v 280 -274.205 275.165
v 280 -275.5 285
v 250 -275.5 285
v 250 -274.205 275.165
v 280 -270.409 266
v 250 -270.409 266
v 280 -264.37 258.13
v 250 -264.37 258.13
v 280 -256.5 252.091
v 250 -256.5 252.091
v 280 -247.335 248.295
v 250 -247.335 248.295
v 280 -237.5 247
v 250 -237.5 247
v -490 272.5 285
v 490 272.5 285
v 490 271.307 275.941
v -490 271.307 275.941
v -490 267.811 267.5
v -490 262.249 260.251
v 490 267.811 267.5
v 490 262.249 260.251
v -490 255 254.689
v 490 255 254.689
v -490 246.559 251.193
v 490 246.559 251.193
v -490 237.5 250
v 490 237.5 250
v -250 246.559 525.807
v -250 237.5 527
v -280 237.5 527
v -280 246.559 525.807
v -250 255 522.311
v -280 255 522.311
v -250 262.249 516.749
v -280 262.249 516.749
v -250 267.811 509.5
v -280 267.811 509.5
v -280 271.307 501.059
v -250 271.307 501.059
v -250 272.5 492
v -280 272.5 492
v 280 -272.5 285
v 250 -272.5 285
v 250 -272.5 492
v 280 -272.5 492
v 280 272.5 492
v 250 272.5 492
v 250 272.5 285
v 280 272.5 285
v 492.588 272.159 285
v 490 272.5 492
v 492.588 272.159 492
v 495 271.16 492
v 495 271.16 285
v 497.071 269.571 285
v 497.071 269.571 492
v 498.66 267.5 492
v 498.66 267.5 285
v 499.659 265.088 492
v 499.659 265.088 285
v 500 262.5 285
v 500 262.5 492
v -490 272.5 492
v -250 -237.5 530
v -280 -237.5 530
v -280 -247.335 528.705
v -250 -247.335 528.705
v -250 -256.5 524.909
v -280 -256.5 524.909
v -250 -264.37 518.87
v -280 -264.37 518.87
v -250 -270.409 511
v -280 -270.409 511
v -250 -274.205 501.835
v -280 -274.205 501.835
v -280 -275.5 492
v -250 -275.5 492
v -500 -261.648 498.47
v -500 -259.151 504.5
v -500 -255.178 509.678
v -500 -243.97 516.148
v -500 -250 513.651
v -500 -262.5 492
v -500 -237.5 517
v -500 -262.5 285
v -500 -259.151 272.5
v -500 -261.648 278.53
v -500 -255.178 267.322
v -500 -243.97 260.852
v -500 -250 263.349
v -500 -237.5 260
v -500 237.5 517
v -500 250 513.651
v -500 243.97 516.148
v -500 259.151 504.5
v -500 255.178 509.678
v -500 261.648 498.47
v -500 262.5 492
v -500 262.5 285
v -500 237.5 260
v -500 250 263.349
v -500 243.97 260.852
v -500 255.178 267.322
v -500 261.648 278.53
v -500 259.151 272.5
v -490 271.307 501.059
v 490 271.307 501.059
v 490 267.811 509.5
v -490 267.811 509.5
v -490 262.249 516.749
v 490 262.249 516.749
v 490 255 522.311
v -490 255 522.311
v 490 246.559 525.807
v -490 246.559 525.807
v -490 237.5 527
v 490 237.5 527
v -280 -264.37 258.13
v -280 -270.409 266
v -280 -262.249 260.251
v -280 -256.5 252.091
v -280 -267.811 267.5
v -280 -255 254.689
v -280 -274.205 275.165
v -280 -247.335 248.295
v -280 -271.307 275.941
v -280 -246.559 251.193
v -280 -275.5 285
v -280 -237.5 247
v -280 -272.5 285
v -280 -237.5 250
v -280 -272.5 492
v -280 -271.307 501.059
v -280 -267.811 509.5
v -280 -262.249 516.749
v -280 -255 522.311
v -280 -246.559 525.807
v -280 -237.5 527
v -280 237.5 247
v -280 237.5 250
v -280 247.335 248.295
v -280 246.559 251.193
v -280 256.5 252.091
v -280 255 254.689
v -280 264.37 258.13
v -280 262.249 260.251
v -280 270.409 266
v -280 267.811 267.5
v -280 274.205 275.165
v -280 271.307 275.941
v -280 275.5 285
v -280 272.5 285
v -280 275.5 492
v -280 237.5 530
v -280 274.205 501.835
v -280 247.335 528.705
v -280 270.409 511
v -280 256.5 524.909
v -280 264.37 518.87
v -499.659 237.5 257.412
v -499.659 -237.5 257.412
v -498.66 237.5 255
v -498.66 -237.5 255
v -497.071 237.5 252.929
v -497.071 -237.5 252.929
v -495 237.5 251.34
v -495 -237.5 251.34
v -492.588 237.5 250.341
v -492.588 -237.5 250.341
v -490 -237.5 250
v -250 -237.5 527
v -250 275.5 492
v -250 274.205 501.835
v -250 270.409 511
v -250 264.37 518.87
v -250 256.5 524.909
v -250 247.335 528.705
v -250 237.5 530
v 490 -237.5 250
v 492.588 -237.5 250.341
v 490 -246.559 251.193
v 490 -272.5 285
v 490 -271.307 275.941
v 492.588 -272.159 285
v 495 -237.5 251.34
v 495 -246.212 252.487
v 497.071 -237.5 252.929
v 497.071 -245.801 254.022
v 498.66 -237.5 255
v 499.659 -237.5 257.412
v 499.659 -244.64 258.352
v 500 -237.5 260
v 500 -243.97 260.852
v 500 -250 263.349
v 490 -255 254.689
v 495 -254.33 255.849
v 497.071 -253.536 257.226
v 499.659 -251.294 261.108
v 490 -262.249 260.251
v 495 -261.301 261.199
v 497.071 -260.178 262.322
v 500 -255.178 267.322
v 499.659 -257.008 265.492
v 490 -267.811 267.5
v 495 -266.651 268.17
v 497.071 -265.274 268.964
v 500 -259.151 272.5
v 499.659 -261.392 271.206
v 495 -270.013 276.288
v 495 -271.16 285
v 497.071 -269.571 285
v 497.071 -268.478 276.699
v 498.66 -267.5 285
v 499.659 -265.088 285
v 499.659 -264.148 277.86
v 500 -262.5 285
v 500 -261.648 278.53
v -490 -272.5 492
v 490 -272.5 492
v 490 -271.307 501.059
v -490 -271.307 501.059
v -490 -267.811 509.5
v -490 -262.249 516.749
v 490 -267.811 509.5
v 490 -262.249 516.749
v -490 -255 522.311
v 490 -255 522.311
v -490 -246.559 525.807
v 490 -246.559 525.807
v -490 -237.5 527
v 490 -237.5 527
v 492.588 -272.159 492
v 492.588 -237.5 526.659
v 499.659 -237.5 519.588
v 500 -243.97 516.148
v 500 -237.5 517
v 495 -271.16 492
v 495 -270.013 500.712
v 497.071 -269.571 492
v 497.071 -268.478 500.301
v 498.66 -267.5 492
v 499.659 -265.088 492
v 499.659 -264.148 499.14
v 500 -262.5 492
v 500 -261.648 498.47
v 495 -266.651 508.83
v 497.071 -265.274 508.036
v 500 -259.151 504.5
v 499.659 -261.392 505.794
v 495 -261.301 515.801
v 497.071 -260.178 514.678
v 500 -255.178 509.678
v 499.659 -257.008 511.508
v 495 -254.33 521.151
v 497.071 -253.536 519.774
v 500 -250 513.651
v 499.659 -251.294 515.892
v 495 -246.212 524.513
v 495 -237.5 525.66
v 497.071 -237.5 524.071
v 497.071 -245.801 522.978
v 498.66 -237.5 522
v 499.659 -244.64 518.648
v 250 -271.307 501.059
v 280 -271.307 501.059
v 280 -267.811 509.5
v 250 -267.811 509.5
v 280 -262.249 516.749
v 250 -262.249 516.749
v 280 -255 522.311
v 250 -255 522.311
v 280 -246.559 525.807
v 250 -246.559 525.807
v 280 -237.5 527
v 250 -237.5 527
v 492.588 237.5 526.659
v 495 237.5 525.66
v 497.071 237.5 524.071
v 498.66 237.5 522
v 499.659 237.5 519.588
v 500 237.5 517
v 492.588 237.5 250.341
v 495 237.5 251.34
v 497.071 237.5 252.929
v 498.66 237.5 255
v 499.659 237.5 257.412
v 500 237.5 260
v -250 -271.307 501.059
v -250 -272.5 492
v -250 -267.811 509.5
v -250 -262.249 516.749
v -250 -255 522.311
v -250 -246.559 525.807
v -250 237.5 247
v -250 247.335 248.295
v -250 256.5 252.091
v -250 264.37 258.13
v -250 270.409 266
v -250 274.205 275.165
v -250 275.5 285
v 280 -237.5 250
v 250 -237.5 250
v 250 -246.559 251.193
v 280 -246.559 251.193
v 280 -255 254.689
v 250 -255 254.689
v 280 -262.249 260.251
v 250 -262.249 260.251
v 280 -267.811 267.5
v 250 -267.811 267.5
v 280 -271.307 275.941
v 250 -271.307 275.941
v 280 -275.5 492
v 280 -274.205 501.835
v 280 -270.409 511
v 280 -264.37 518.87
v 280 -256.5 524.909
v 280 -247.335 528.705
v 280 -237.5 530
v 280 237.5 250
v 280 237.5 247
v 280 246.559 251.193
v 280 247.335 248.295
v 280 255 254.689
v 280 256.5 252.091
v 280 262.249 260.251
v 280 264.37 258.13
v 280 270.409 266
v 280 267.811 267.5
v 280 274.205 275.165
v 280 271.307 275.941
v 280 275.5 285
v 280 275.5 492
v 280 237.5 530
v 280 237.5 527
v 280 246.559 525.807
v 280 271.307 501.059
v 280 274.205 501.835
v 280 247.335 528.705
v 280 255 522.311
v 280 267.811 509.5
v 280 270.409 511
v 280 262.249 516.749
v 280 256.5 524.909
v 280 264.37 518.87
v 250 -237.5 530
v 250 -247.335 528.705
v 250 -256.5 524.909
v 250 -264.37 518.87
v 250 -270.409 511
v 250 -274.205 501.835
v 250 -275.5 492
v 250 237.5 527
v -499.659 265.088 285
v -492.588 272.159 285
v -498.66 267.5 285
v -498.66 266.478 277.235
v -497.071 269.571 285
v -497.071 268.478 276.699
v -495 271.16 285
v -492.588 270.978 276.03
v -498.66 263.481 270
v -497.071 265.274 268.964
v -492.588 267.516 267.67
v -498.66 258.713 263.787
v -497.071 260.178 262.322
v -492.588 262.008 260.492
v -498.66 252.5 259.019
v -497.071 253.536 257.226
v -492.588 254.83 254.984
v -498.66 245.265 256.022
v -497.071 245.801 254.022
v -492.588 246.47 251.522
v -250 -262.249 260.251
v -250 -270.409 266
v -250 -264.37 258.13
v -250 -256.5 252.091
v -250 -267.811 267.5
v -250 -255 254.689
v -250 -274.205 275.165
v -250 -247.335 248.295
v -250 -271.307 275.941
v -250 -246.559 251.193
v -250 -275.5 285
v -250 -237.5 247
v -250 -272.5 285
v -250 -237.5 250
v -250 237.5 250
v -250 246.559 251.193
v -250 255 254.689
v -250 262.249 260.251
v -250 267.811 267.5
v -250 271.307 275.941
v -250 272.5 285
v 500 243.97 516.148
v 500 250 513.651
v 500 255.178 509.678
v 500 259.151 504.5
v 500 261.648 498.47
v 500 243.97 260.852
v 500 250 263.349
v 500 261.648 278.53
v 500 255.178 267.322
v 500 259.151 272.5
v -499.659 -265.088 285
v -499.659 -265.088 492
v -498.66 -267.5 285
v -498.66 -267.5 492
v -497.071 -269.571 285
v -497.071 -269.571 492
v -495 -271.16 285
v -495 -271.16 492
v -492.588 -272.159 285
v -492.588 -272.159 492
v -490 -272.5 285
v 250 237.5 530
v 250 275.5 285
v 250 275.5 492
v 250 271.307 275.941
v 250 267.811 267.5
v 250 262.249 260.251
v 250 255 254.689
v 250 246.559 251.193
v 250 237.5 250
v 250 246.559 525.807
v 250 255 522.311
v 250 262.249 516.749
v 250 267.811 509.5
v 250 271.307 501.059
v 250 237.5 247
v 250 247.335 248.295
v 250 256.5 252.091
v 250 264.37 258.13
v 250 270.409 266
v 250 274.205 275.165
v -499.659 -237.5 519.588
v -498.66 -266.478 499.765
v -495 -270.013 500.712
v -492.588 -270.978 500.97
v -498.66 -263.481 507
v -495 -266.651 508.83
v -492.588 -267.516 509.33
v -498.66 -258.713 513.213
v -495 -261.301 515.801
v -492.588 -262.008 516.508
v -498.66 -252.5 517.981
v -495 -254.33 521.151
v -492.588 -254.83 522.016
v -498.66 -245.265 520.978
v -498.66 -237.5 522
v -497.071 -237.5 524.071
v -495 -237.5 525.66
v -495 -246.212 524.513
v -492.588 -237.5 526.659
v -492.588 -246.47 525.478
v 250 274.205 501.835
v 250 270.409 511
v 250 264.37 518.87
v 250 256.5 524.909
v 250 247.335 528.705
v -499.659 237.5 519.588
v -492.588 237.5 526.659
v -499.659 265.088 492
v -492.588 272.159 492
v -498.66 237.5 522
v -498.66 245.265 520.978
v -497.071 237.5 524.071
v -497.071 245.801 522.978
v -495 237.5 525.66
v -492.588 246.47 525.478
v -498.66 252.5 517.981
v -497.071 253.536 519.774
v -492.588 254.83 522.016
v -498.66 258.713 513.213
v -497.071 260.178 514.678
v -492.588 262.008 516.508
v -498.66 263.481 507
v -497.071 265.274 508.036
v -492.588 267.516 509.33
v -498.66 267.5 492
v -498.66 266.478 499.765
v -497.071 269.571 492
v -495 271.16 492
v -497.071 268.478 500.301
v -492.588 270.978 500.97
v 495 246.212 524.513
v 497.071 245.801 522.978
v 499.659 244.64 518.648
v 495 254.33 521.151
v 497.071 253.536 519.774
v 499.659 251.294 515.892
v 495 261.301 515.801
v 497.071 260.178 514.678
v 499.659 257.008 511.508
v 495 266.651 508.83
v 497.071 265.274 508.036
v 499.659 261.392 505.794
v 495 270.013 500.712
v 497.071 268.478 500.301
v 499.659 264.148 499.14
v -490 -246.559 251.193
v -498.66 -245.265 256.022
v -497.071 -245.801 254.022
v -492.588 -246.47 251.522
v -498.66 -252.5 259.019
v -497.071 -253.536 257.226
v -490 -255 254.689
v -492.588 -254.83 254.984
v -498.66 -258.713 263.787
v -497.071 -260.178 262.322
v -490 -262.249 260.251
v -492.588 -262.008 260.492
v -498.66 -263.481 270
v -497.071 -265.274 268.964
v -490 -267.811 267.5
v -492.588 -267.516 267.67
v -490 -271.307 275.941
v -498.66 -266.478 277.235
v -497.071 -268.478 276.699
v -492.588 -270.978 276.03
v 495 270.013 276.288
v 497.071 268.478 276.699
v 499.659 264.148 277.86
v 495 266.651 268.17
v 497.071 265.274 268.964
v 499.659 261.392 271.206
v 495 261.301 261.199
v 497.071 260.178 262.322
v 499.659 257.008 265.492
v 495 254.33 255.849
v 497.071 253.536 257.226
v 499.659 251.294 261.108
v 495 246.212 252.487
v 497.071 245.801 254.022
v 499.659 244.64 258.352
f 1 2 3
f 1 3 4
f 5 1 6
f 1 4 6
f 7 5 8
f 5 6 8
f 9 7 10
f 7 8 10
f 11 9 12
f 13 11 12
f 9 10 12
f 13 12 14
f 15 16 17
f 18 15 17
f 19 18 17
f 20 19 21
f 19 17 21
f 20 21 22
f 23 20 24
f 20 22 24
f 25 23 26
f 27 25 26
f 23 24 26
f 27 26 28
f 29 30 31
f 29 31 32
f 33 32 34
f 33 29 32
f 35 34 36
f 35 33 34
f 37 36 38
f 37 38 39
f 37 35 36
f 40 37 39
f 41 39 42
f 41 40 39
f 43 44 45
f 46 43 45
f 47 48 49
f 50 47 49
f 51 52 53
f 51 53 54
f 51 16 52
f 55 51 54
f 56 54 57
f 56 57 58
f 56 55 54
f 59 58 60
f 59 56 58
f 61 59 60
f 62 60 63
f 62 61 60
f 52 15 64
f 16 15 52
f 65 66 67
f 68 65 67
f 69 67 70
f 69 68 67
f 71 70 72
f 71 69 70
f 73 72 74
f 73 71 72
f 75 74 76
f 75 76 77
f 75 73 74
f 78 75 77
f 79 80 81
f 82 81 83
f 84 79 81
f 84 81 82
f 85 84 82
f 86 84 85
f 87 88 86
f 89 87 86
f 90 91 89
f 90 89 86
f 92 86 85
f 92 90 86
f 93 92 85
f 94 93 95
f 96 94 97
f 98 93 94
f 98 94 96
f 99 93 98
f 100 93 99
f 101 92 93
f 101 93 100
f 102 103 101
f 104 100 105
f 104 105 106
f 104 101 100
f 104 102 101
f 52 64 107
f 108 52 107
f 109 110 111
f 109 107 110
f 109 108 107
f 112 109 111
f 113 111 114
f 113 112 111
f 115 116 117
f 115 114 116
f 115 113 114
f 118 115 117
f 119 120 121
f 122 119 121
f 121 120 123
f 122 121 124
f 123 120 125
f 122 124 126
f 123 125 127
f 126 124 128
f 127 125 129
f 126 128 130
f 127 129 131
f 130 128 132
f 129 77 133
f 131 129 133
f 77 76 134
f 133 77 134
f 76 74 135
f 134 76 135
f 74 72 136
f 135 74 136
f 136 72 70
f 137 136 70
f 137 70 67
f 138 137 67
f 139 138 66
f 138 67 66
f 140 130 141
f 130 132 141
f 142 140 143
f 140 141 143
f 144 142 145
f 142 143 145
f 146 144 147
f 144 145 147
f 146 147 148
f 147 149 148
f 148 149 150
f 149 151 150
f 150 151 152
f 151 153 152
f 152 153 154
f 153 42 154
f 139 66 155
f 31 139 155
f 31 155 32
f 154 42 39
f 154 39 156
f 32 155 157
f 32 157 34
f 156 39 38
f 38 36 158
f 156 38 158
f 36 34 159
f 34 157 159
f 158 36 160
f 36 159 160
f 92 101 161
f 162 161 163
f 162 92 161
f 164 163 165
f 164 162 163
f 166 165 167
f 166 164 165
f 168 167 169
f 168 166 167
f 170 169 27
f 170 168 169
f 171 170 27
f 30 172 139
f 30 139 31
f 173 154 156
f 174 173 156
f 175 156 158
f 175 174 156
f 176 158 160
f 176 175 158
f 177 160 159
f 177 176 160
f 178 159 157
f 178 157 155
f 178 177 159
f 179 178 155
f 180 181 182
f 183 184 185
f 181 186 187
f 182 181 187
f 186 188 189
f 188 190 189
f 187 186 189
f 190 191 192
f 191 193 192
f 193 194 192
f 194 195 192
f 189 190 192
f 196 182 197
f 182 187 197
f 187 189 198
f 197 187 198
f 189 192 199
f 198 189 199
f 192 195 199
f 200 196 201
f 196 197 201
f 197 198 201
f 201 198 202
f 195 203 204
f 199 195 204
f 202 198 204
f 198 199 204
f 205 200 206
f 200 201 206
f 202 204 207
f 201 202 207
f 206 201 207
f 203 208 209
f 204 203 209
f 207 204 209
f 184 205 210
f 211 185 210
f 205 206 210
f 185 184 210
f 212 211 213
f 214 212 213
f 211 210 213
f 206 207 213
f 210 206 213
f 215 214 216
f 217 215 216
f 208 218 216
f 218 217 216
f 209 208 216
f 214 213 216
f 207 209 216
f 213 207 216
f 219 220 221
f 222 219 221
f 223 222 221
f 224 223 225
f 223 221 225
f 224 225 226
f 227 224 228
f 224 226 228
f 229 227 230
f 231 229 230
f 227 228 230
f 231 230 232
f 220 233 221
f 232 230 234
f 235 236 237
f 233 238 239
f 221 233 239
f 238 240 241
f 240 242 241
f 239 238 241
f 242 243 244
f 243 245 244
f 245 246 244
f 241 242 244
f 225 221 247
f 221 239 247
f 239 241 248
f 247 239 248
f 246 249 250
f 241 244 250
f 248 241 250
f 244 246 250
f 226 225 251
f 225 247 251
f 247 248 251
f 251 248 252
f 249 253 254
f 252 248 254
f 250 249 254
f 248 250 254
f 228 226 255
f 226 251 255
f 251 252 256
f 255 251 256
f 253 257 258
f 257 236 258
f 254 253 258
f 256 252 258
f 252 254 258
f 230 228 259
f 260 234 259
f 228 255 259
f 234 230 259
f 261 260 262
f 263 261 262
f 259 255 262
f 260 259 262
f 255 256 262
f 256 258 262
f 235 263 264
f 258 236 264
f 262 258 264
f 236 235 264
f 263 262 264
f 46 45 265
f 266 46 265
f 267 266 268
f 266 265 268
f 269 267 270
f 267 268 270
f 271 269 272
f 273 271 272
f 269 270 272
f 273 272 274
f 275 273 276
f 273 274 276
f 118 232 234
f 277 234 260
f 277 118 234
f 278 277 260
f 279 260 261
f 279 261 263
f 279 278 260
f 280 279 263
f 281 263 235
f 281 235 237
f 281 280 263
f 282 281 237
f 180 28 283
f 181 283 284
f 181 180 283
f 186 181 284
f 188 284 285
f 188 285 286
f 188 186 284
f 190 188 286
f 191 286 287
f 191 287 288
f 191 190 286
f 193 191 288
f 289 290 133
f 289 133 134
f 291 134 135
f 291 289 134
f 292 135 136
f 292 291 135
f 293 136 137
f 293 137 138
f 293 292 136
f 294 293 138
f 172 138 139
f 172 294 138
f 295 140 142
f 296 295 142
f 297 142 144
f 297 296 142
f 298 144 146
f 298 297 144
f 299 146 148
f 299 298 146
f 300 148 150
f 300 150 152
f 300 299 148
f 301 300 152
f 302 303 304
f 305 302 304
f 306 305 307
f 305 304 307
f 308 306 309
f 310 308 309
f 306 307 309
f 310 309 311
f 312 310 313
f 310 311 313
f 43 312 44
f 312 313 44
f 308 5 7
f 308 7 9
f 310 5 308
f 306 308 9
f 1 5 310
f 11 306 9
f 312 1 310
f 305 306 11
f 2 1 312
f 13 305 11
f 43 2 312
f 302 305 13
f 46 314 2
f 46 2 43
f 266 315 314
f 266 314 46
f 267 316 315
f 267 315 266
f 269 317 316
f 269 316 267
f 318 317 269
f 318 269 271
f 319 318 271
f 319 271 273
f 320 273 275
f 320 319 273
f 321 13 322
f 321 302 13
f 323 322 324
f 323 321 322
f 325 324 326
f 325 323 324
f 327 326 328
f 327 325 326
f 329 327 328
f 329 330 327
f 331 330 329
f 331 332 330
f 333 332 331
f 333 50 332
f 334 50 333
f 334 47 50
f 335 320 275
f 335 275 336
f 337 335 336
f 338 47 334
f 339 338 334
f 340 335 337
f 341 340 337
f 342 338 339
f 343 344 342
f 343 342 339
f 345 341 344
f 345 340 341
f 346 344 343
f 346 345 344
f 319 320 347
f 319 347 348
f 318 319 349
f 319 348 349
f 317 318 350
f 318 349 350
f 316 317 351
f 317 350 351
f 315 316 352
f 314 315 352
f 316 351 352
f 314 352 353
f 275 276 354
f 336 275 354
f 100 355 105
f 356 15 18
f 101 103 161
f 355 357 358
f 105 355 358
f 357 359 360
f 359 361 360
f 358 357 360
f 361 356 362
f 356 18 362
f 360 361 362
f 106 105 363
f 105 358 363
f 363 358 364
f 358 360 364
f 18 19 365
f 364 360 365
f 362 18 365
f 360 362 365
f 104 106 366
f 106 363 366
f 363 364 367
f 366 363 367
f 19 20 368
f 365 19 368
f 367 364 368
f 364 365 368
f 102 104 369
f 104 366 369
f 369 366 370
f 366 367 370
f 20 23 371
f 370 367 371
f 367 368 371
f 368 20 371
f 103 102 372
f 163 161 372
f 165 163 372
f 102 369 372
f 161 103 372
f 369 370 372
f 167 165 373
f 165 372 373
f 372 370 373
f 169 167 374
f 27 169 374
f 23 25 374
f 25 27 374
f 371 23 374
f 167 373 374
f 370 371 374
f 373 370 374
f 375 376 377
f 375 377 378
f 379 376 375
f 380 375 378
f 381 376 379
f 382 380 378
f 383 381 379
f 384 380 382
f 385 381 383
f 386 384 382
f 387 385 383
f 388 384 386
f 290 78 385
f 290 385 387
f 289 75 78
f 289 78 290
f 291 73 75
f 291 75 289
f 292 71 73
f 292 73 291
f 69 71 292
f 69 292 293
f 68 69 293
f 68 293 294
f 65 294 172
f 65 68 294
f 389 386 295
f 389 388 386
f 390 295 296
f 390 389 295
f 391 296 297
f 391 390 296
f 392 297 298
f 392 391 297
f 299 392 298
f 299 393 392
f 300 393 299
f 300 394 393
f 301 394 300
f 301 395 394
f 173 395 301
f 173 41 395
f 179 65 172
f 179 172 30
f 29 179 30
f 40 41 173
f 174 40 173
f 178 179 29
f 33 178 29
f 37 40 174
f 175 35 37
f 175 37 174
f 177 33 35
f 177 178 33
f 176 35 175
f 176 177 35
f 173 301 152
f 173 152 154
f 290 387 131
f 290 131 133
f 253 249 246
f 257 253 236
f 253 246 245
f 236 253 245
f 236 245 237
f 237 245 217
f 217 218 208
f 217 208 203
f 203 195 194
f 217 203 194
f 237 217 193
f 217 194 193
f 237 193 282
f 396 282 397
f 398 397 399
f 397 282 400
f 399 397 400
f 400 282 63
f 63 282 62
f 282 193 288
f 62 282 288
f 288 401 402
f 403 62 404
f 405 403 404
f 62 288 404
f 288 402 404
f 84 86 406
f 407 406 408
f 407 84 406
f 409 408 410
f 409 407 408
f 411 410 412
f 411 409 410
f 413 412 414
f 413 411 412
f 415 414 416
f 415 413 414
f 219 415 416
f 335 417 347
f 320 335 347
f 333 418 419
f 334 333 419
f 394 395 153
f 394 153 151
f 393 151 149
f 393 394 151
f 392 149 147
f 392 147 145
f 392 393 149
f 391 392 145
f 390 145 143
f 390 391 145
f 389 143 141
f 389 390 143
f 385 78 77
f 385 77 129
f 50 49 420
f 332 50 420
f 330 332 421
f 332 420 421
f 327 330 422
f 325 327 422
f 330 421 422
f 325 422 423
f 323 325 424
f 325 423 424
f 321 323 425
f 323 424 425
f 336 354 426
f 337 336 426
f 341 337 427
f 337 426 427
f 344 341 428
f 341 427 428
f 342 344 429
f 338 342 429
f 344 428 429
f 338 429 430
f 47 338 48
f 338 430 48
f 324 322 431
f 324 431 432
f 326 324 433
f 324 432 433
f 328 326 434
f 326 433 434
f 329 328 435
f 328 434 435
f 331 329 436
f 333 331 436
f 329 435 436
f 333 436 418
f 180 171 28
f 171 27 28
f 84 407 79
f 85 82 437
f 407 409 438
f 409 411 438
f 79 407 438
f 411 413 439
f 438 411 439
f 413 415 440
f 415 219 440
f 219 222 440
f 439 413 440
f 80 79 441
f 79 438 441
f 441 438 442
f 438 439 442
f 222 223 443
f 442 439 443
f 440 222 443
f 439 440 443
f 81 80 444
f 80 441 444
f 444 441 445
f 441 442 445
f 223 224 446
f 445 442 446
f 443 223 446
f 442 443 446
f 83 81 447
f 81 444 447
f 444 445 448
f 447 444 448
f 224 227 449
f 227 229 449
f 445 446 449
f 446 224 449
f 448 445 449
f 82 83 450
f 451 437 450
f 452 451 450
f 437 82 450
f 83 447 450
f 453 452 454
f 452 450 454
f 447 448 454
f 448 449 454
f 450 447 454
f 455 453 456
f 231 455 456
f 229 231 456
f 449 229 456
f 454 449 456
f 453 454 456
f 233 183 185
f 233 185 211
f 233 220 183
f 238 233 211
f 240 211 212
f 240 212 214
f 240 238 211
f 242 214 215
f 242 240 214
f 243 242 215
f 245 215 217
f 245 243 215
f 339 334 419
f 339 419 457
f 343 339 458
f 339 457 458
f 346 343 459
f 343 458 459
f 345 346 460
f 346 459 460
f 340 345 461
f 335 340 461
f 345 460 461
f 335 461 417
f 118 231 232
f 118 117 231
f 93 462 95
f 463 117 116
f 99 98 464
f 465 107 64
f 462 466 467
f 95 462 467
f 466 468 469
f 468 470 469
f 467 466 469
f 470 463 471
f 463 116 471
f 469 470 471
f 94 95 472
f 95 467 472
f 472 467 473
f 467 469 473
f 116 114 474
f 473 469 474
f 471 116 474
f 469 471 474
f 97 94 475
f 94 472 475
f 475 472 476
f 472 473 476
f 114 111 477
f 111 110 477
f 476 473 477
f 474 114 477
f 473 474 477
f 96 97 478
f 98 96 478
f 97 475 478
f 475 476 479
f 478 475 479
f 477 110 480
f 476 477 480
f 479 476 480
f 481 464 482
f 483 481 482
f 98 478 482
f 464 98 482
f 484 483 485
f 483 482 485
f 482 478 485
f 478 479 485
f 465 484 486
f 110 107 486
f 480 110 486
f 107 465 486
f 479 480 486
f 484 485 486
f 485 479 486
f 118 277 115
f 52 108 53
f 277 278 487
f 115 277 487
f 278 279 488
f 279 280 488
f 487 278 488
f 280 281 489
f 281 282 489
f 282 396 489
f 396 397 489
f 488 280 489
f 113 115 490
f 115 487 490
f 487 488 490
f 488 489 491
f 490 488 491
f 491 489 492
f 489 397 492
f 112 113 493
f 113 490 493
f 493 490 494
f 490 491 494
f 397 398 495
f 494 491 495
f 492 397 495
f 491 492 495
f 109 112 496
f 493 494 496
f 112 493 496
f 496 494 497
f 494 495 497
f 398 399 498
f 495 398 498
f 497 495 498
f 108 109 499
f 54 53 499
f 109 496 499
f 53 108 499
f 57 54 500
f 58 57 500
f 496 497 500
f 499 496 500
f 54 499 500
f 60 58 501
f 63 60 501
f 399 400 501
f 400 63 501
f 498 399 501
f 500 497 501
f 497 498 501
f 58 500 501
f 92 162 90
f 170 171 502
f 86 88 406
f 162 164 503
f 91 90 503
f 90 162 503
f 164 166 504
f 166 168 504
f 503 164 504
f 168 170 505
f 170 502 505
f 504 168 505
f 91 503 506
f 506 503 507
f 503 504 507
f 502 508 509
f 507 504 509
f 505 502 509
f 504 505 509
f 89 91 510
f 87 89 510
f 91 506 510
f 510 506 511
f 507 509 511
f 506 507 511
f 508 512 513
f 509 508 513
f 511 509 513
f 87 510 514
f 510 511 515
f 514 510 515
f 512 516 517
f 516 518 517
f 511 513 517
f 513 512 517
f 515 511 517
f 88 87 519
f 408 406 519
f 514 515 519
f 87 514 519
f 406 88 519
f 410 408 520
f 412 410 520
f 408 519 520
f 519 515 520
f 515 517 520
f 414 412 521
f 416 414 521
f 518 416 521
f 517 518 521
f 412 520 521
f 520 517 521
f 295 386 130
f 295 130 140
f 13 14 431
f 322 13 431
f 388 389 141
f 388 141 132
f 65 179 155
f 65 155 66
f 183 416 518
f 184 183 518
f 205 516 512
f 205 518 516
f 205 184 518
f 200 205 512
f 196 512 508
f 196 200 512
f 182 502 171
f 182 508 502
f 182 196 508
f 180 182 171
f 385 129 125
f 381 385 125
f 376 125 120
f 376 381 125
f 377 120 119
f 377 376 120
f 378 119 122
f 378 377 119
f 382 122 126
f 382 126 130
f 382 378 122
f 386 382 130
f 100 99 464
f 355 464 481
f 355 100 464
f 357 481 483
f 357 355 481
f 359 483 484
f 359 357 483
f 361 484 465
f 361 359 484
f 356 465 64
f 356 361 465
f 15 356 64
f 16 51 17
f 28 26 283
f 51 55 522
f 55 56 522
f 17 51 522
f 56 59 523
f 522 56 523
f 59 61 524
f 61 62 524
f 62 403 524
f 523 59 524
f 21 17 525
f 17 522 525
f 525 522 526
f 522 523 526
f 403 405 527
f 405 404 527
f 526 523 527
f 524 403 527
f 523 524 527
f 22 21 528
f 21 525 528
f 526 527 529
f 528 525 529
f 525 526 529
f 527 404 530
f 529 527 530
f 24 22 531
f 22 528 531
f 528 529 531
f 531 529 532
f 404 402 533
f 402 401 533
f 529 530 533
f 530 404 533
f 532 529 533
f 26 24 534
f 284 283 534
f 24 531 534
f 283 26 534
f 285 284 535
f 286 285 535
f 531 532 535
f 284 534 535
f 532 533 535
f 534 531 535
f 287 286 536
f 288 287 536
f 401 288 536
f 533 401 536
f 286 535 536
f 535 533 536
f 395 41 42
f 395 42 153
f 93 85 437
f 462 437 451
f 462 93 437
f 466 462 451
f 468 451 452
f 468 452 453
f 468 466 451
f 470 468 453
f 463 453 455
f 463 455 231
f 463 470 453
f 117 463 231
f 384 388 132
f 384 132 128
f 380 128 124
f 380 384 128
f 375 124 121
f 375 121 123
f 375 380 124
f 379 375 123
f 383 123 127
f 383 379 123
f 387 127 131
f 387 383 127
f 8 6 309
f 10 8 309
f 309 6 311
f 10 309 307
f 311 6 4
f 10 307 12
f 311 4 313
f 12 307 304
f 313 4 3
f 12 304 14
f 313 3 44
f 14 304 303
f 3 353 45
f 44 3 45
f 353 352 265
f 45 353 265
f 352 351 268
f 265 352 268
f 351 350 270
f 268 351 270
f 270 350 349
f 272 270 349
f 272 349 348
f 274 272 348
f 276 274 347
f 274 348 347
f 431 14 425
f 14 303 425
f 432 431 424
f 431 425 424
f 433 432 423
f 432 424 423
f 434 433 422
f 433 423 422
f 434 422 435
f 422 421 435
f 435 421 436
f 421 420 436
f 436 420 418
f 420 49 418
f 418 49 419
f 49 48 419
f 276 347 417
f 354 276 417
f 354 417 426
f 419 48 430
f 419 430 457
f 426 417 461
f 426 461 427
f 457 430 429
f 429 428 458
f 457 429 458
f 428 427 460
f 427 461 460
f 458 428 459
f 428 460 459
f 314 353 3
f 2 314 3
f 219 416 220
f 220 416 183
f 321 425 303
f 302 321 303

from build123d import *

# Parameters (mm, degrees)
F1_W     = 1000
F1_H     = 545
F2_DEPTH = 277
F3_R     = 35
F4_R     = 10
F7_DEPTH = 30


with BuildPart() as f2:
    # F1 (on offset) → F2 (new body)
    with BuildSketch(Plane.XY.offset(250)):
        Rectangle(F1_W, F1_H)
    extrude(amount=F2_DEPTH)

    # F3
    f3_edges = [f2.edges().sort_by_distance(p)[0] for p in [
        (0, -272.5, 527),
        (0, -272.5, 250),
        (0, 272.5, 527),
        (0, 272.5, 250),
    ]]
    fillet(f3_edges, radius=F3_R)

    # F4
    f4_edges = [f2.edges().sort_by_distance(p)[0] for p in [
        (-500, 0, 527),
        (500, 0, 527),
    ]]
    fillet(f4_edges, radius=F4_R)


with BuildPart() as f7:
    # F6 (on offset) → F7 (new body)
    with BuildSketch(Plane.YZ.offset(250)):
        with BuildLine():
            ThreePointArc((-237.5, 530), (-264.370058, 518.870058), (-275.5, 492))
            Line((-275.5, 492), (-275.5, 285))
            ThreePointArc((-275.5, 285), (-264.370058, 258.129942), (-237.5, 247))
            Line((-237.5, 247), (237.5, 247))
            ThreePointArc((237.5, 247), (264.370058, 258.129942), (275.5, 285))
            Line((275.5, 285), (275.5, 492))
            ThreePointArc((275.5, 492), (264.370058, 518.870058), (237.5, 530))
            Line((237.5, 530), (-237.5, 530))
        make_face()
        with BuildLine():
            Line((-272.5, 285), (-272.5, 492))
            ThreePointArc((-272.5, 492), (-262.248737, 516.748737), (-237.5, 527))
            Line((-237.5, 527), (237.5, 527))
            ThreePointArc((237.5, 527), (262.248737, 516.748737), (272.5, 492))
            Line((272.5, 492), (272.5, 285))
            ThreePointArc((272.5, 285), (262.248737, 260.251263), (237.5, 250))
            Line((237.5, 250), (-237.5, 250))
            ThreePointArc((-237.5, 250), (-262.248737, 260.251263), (-272.5, 285))
        make_face(mode=Mode.SUBTRACT)
    extrude(amount=F7_DEPTH)


with BuildPart() as f8_1:
    # F8: instance of F7
    add(f7.part.mirror(Plane.YZ))


solid = Compound([f2.part, f7.part, f8_1.part])
